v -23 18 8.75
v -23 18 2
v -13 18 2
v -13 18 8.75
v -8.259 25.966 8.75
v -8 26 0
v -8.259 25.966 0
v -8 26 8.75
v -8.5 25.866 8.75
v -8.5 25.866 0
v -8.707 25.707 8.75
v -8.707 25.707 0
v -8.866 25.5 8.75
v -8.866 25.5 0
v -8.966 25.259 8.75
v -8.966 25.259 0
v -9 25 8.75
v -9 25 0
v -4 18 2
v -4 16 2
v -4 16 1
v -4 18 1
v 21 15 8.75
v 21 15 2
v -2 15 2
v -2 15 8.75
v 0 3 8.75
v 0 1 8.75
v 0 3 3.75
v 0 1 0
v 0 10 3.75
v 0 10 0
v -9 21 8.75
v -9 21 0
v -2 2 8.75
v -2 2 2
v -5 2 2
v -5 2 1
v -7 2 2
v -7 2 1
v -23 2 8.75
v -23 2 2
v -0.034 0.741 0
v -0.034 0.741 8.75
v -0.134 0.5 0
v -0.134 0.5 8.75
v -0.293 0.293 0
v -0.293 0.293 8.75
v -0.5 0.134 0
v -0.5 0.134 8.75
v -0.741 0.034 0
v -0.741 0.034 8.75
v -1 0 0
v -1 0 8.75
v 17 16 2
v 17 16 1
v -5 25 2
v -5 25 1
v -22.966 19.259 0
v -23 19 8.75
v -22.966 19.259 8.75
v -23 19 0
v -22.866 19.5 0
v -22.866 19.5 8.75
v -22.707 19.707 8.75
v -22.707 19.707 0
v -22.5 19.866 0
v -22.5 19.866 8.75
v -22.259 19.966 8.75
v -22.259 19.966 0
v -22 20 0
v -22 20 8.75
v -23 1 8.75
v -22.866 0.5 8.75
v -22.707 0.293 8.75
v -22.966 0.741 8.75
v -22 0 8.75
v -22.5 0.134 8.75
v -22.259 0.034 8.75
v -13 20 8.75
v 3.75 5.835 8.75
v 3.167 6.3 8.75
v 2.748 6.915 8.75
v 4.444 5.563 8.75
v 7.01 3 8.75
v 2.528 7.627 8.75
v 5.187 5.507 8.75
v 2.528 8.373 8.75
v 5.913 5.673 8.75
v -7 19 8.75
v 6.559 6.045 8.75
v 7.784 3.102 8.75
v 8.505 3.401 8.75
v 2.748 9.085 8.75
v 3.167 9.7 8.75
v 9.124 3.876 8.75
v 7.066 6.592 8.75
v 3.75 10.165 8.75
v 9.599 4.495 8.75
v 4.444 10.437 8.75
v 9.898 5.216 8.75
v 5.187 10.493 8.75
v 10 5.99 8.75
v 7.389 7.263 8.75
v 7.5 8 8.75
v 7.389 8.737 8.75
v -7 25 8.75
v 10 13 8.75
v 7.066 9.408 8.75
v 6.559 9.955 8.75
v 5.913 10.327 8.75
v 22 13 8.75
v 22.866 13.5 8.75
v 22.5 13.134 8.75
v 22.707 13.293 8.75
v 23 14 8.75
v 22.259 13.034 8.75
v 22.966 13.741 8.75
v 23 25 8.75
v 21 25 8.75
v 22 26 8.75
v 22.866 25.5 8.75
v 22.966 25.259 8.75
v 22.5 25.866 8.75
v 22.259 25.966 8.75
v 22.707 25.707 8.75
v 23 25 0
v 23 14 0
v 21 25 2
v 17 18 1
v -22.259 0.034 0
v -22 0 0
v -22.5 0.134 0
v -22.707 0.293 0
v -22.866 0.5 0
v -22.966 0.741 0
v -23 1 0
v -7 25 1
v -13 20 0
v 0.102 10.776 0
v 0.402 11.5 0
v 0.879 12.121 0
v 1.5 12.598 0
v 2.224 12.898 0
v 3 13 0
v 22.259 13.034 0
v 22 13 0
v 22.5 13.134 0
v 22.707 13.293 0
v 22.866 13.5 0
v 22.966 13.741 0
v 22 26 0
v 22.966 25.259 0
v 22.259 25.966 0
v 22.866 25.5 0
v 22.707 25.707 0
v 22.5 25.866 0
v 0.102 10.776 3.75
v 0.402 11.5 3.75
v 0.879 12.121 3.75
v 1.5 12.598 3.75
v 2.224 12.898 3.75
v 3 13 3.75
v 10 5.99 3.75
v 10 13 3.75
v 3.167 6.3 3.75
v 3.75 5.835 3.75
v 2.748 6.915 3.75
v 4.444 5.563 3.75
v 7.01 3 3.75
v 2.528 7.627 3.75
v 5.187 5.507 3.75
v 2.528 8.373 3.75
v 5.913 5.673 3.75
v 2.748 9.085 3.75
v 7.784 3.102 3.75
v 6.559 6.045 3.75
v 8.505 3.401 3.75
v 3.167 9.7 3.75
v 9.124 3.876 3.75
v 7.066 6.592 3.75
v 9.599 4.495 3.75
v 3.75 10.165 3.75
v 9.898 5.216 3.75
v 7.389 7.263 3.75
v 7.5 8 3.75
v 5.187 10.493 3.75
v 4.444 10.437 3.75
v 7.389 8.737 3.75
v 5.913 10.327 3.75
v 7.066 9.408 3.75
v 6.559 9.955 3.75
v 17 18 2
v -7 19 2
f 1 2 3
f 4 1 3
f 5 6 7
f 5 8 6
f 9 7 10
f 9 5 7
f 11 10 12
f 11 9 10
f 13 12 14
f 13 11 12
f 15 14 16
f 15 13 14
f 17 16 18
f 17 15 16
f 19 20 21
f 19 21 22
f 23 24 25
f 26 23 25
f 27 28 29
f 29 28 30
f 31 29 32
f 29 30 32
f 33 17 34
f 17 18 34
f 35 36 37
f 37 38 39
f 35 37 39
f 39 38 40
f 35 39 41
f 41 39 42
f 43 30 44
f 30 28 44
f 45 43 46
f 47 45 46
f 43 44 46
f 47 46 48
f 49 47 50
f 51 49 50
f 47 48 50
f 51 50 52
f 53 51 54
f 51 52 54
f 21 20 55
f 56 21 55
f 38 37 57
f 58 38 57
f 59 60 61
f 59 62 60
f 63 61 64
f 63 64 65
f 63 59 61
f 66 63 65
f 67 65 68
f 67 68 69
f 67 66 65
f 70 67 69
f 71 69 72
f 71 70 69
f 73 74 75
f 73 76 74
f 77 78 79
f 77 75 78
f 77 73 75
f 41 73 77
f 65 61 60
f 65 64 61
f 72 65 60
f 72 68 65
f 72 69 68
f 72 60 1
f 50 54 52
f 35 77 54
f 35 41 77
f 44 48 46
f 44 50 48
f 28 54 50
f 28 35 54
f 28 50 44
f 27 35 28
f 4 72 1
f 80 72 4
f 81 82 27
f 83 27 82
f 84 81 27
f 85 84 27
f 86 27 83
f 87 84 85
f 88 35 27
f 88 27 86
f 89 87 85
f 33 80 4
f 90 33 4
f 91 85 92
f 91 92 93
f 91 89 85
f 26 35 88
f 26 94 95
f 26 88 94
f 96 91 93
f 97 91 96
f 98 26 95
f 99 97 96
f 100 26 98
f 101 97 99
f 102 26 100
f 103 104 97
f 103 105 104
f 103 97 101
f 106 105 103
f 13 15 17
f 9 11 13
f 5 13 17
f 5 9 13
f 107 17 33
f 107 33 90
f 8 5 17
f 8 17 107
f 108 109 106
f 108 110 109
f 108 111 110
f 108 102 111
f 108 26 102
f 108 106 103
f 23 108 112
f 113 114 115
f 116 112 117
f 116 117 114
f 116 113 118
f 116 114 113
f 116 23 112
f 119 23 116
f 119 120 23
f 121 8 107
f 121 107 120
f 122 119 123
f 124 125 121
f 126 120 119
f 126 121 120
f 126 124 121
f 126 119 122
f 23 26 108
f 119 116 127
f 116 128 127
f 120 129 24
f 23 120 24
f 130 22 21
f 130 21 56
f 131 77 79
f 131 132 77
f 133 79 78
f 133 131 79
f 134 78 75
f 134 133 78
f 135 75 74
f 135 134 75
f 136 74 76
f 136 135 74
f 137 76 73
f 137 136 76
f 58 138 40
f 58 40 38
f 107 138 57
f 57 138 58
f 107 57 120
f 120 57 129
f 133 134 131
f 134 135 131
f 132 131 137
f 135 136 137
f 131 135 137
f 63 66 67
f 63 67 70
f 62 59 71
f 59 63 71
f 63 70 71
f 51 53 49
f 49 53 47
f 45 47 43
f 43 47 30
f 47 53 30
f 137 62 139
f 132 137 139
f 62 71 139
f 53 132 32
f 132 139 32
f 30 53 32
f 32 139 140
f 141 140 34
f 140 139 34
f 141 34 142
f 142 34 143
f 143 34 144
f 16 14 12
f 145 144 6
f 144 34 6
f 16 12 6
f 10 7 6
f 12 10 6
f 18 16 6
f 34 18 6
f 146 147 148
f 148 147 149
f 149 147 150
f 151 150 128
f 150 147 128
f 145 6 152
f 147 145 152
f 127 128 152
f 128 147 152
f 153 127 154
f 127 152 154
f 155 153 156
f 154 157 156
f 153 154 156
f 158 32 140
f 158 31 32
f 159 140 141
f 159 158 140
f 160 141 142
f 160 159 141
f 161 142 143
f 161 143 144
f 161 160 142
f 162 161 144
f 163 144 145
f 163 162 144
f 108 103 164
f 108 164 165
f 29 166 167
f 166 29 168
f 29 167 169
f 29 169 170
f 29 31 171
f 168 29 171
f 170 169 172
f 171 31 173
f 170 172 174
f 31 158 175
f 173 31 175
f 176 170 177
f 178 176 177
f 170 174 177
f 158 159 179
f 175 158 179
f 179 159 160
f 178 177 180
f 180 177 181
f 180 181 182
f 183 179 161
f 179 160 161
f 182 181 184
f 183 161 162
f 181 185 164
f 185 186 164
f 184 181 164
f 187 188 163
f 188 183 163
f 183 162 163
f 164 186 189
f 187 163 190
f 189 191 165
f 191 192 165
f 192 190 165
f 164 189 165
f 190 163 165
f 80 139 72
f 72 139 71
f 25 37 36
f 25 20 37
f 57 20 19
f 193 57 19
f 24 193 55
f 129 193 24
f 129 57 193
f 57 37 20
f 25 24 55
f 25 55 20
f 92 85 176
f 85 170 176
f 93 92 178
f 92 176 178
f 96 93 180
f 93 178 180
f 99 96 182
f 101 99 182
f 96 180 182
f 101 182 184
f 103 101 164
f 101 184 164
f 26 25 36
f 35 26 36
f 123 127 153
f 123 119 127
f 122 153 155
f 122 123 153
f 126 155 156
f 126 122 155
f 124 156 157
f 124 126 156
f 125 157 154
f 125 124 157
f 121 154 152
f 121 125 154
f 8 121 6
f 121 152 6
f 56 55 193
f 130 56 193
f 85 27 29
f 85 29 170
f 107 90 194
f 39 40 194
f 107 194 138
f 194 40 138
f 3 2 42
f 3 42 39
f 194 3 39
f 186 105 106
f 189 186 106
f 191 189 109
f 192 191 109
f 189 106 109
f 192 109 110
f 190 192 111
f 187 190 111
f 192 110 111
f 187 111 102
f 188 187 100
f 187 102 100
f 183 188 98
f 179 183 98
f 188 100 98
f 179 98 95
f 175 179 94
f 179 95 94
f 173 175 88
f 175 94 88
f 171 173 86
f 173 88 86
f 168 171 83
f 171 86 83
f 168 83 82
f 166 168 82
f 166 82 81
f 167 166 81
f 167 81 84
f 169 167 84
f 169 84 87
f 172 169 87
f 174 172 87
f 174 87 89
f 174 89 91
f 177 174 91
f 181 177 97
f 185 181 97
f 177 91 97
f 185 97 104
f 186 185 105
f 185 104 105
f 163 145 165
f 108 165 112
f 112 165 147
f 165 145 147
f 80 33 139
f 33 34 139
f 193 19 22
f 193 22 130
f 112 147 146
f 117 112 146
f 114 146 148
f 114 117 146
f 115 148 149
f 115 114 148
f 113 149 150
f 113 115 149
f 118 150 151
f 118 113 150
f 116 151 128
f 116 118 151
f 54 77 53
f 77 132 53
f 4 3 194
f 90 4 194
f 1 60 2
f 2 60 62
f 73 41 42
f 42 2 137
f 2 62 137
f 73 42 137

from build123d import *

# Parameters (mm, degrees)
PAD098_DEPTH    = 2
PAD099_DEPTH    = 6.75
SKETCH137_W     = 2
SKETCH137_H     = 23
SKETCH137_W_2   = 21
SKETCH137_H_2   = 2
POCKET040_DEPTH = 1
SKETCH138_W     = 10
SKETCH138_H     = 10
PAD100_DEPTH    = 5
SKETCH139_R     = 2.5
POCKET041_DEPTH = 5
FILLET024_R     = 2.99
FILLET025_R     = 1
FILLET026_R     = 3


with BuildPart() as part:
    # Sketch135 → Pad098 (new body)
    with BuildSketch(Plane.XY):
        Polygon((-23, 18), (-23, 0), (0, 0), (0, 13), (23, 13), (23, 26), (-7, 26), (-9, 26), (-9, 21), (-13, 20), (-23, 20), align=None)
    extrude(amount=PAD098_DEPTH)

    # Sketch136 (on Face13 of Pad098) → Pad099 (join)
    with BuildSketch(Plane.XY.offset(2)):
        Polygon((-23, 0), (0, 0), (0, 13), (23, 13), (23, 26), (-9, 26), (-9, 21), (-13, 20), (-23, 20), (-23, 18), (-13, 18), (-7, 19), (-7, 25), (21, 25), (21, 15), (-2, 15), (-2, 2), (-23, 2), align=None)
    extrude(amount=PAD099_DEPTH)

    # Sketch137 (on Face7 of Pad099) → Pocket040 (cut)
    with BuildSketch(Plane.XY.offset(2)):
        with Locations((-6, 13.5)):
            Rectangle(SKETCH137_W, SKETCH137_H)
        with Locations((6.5, 17)):
            Rectangle(SKETCH137_W_2, SKETCH137_H_2)
    extrude(amount=-POCKET040_DEPTH, mode=Mode.SUBTRACT)

    # Sketch138 (on Face18 of Pocket040) → Pad100 (join)
    with BuildSketch(Plane.XY.offset(8.75)):
        with Locations((5, 8)):
            Rectangle(SKETCH138_W, SKETCH138_H)
    extrude(amount=-PAD100_DEPTH)

    # Sketch139 (on Face29 of Pad100) → Pocket041 (cut)
    with BuildSketch(Plane.XY.offset(8.75)):
        with Locations((5, 8)):
            Circle(SKETCH139_R)
    extrude(amount=-POCKET041_DEPTH, mode=Mode.SUBTRACT)

    # Fillet024
    fillet024_edges = [part.edges().sort_by_distance(p)[0] for p in [
        (10, 3, 6.25),
    ]]
    fillet(fillet024_edges, radius=FILLET024_R)

    # Fillet025
    fillet025_edges = [part.edges().sort_by_distance(p)[0] for p in [
        (23, 13, 1),
        (23, 13, 5.375),
        (0, 0, 5.375),
        (0, 0, 1),
        (-23, 0, 5.375),
        (-23, 0, 1),
        (23, 26, 1),
        (23, 26, 5.375),
        (-23, 20, 1),
        (-23, 20, 5.375),
        (-9, 26, 1),
        (-9, 26, 5.375),
    ]]
    fillet(fillet025_edges, radius=FILLET025_R)

    # Fillet026
    fillet026_edges = [part.edges().sort_by_distance(p)[0] for p in [
        (0, 13, 2.875),
        (0, 13, 1),
    ]]
    fillet(fillet026_edges, radius=FILLET026_R)


solid = part.part
